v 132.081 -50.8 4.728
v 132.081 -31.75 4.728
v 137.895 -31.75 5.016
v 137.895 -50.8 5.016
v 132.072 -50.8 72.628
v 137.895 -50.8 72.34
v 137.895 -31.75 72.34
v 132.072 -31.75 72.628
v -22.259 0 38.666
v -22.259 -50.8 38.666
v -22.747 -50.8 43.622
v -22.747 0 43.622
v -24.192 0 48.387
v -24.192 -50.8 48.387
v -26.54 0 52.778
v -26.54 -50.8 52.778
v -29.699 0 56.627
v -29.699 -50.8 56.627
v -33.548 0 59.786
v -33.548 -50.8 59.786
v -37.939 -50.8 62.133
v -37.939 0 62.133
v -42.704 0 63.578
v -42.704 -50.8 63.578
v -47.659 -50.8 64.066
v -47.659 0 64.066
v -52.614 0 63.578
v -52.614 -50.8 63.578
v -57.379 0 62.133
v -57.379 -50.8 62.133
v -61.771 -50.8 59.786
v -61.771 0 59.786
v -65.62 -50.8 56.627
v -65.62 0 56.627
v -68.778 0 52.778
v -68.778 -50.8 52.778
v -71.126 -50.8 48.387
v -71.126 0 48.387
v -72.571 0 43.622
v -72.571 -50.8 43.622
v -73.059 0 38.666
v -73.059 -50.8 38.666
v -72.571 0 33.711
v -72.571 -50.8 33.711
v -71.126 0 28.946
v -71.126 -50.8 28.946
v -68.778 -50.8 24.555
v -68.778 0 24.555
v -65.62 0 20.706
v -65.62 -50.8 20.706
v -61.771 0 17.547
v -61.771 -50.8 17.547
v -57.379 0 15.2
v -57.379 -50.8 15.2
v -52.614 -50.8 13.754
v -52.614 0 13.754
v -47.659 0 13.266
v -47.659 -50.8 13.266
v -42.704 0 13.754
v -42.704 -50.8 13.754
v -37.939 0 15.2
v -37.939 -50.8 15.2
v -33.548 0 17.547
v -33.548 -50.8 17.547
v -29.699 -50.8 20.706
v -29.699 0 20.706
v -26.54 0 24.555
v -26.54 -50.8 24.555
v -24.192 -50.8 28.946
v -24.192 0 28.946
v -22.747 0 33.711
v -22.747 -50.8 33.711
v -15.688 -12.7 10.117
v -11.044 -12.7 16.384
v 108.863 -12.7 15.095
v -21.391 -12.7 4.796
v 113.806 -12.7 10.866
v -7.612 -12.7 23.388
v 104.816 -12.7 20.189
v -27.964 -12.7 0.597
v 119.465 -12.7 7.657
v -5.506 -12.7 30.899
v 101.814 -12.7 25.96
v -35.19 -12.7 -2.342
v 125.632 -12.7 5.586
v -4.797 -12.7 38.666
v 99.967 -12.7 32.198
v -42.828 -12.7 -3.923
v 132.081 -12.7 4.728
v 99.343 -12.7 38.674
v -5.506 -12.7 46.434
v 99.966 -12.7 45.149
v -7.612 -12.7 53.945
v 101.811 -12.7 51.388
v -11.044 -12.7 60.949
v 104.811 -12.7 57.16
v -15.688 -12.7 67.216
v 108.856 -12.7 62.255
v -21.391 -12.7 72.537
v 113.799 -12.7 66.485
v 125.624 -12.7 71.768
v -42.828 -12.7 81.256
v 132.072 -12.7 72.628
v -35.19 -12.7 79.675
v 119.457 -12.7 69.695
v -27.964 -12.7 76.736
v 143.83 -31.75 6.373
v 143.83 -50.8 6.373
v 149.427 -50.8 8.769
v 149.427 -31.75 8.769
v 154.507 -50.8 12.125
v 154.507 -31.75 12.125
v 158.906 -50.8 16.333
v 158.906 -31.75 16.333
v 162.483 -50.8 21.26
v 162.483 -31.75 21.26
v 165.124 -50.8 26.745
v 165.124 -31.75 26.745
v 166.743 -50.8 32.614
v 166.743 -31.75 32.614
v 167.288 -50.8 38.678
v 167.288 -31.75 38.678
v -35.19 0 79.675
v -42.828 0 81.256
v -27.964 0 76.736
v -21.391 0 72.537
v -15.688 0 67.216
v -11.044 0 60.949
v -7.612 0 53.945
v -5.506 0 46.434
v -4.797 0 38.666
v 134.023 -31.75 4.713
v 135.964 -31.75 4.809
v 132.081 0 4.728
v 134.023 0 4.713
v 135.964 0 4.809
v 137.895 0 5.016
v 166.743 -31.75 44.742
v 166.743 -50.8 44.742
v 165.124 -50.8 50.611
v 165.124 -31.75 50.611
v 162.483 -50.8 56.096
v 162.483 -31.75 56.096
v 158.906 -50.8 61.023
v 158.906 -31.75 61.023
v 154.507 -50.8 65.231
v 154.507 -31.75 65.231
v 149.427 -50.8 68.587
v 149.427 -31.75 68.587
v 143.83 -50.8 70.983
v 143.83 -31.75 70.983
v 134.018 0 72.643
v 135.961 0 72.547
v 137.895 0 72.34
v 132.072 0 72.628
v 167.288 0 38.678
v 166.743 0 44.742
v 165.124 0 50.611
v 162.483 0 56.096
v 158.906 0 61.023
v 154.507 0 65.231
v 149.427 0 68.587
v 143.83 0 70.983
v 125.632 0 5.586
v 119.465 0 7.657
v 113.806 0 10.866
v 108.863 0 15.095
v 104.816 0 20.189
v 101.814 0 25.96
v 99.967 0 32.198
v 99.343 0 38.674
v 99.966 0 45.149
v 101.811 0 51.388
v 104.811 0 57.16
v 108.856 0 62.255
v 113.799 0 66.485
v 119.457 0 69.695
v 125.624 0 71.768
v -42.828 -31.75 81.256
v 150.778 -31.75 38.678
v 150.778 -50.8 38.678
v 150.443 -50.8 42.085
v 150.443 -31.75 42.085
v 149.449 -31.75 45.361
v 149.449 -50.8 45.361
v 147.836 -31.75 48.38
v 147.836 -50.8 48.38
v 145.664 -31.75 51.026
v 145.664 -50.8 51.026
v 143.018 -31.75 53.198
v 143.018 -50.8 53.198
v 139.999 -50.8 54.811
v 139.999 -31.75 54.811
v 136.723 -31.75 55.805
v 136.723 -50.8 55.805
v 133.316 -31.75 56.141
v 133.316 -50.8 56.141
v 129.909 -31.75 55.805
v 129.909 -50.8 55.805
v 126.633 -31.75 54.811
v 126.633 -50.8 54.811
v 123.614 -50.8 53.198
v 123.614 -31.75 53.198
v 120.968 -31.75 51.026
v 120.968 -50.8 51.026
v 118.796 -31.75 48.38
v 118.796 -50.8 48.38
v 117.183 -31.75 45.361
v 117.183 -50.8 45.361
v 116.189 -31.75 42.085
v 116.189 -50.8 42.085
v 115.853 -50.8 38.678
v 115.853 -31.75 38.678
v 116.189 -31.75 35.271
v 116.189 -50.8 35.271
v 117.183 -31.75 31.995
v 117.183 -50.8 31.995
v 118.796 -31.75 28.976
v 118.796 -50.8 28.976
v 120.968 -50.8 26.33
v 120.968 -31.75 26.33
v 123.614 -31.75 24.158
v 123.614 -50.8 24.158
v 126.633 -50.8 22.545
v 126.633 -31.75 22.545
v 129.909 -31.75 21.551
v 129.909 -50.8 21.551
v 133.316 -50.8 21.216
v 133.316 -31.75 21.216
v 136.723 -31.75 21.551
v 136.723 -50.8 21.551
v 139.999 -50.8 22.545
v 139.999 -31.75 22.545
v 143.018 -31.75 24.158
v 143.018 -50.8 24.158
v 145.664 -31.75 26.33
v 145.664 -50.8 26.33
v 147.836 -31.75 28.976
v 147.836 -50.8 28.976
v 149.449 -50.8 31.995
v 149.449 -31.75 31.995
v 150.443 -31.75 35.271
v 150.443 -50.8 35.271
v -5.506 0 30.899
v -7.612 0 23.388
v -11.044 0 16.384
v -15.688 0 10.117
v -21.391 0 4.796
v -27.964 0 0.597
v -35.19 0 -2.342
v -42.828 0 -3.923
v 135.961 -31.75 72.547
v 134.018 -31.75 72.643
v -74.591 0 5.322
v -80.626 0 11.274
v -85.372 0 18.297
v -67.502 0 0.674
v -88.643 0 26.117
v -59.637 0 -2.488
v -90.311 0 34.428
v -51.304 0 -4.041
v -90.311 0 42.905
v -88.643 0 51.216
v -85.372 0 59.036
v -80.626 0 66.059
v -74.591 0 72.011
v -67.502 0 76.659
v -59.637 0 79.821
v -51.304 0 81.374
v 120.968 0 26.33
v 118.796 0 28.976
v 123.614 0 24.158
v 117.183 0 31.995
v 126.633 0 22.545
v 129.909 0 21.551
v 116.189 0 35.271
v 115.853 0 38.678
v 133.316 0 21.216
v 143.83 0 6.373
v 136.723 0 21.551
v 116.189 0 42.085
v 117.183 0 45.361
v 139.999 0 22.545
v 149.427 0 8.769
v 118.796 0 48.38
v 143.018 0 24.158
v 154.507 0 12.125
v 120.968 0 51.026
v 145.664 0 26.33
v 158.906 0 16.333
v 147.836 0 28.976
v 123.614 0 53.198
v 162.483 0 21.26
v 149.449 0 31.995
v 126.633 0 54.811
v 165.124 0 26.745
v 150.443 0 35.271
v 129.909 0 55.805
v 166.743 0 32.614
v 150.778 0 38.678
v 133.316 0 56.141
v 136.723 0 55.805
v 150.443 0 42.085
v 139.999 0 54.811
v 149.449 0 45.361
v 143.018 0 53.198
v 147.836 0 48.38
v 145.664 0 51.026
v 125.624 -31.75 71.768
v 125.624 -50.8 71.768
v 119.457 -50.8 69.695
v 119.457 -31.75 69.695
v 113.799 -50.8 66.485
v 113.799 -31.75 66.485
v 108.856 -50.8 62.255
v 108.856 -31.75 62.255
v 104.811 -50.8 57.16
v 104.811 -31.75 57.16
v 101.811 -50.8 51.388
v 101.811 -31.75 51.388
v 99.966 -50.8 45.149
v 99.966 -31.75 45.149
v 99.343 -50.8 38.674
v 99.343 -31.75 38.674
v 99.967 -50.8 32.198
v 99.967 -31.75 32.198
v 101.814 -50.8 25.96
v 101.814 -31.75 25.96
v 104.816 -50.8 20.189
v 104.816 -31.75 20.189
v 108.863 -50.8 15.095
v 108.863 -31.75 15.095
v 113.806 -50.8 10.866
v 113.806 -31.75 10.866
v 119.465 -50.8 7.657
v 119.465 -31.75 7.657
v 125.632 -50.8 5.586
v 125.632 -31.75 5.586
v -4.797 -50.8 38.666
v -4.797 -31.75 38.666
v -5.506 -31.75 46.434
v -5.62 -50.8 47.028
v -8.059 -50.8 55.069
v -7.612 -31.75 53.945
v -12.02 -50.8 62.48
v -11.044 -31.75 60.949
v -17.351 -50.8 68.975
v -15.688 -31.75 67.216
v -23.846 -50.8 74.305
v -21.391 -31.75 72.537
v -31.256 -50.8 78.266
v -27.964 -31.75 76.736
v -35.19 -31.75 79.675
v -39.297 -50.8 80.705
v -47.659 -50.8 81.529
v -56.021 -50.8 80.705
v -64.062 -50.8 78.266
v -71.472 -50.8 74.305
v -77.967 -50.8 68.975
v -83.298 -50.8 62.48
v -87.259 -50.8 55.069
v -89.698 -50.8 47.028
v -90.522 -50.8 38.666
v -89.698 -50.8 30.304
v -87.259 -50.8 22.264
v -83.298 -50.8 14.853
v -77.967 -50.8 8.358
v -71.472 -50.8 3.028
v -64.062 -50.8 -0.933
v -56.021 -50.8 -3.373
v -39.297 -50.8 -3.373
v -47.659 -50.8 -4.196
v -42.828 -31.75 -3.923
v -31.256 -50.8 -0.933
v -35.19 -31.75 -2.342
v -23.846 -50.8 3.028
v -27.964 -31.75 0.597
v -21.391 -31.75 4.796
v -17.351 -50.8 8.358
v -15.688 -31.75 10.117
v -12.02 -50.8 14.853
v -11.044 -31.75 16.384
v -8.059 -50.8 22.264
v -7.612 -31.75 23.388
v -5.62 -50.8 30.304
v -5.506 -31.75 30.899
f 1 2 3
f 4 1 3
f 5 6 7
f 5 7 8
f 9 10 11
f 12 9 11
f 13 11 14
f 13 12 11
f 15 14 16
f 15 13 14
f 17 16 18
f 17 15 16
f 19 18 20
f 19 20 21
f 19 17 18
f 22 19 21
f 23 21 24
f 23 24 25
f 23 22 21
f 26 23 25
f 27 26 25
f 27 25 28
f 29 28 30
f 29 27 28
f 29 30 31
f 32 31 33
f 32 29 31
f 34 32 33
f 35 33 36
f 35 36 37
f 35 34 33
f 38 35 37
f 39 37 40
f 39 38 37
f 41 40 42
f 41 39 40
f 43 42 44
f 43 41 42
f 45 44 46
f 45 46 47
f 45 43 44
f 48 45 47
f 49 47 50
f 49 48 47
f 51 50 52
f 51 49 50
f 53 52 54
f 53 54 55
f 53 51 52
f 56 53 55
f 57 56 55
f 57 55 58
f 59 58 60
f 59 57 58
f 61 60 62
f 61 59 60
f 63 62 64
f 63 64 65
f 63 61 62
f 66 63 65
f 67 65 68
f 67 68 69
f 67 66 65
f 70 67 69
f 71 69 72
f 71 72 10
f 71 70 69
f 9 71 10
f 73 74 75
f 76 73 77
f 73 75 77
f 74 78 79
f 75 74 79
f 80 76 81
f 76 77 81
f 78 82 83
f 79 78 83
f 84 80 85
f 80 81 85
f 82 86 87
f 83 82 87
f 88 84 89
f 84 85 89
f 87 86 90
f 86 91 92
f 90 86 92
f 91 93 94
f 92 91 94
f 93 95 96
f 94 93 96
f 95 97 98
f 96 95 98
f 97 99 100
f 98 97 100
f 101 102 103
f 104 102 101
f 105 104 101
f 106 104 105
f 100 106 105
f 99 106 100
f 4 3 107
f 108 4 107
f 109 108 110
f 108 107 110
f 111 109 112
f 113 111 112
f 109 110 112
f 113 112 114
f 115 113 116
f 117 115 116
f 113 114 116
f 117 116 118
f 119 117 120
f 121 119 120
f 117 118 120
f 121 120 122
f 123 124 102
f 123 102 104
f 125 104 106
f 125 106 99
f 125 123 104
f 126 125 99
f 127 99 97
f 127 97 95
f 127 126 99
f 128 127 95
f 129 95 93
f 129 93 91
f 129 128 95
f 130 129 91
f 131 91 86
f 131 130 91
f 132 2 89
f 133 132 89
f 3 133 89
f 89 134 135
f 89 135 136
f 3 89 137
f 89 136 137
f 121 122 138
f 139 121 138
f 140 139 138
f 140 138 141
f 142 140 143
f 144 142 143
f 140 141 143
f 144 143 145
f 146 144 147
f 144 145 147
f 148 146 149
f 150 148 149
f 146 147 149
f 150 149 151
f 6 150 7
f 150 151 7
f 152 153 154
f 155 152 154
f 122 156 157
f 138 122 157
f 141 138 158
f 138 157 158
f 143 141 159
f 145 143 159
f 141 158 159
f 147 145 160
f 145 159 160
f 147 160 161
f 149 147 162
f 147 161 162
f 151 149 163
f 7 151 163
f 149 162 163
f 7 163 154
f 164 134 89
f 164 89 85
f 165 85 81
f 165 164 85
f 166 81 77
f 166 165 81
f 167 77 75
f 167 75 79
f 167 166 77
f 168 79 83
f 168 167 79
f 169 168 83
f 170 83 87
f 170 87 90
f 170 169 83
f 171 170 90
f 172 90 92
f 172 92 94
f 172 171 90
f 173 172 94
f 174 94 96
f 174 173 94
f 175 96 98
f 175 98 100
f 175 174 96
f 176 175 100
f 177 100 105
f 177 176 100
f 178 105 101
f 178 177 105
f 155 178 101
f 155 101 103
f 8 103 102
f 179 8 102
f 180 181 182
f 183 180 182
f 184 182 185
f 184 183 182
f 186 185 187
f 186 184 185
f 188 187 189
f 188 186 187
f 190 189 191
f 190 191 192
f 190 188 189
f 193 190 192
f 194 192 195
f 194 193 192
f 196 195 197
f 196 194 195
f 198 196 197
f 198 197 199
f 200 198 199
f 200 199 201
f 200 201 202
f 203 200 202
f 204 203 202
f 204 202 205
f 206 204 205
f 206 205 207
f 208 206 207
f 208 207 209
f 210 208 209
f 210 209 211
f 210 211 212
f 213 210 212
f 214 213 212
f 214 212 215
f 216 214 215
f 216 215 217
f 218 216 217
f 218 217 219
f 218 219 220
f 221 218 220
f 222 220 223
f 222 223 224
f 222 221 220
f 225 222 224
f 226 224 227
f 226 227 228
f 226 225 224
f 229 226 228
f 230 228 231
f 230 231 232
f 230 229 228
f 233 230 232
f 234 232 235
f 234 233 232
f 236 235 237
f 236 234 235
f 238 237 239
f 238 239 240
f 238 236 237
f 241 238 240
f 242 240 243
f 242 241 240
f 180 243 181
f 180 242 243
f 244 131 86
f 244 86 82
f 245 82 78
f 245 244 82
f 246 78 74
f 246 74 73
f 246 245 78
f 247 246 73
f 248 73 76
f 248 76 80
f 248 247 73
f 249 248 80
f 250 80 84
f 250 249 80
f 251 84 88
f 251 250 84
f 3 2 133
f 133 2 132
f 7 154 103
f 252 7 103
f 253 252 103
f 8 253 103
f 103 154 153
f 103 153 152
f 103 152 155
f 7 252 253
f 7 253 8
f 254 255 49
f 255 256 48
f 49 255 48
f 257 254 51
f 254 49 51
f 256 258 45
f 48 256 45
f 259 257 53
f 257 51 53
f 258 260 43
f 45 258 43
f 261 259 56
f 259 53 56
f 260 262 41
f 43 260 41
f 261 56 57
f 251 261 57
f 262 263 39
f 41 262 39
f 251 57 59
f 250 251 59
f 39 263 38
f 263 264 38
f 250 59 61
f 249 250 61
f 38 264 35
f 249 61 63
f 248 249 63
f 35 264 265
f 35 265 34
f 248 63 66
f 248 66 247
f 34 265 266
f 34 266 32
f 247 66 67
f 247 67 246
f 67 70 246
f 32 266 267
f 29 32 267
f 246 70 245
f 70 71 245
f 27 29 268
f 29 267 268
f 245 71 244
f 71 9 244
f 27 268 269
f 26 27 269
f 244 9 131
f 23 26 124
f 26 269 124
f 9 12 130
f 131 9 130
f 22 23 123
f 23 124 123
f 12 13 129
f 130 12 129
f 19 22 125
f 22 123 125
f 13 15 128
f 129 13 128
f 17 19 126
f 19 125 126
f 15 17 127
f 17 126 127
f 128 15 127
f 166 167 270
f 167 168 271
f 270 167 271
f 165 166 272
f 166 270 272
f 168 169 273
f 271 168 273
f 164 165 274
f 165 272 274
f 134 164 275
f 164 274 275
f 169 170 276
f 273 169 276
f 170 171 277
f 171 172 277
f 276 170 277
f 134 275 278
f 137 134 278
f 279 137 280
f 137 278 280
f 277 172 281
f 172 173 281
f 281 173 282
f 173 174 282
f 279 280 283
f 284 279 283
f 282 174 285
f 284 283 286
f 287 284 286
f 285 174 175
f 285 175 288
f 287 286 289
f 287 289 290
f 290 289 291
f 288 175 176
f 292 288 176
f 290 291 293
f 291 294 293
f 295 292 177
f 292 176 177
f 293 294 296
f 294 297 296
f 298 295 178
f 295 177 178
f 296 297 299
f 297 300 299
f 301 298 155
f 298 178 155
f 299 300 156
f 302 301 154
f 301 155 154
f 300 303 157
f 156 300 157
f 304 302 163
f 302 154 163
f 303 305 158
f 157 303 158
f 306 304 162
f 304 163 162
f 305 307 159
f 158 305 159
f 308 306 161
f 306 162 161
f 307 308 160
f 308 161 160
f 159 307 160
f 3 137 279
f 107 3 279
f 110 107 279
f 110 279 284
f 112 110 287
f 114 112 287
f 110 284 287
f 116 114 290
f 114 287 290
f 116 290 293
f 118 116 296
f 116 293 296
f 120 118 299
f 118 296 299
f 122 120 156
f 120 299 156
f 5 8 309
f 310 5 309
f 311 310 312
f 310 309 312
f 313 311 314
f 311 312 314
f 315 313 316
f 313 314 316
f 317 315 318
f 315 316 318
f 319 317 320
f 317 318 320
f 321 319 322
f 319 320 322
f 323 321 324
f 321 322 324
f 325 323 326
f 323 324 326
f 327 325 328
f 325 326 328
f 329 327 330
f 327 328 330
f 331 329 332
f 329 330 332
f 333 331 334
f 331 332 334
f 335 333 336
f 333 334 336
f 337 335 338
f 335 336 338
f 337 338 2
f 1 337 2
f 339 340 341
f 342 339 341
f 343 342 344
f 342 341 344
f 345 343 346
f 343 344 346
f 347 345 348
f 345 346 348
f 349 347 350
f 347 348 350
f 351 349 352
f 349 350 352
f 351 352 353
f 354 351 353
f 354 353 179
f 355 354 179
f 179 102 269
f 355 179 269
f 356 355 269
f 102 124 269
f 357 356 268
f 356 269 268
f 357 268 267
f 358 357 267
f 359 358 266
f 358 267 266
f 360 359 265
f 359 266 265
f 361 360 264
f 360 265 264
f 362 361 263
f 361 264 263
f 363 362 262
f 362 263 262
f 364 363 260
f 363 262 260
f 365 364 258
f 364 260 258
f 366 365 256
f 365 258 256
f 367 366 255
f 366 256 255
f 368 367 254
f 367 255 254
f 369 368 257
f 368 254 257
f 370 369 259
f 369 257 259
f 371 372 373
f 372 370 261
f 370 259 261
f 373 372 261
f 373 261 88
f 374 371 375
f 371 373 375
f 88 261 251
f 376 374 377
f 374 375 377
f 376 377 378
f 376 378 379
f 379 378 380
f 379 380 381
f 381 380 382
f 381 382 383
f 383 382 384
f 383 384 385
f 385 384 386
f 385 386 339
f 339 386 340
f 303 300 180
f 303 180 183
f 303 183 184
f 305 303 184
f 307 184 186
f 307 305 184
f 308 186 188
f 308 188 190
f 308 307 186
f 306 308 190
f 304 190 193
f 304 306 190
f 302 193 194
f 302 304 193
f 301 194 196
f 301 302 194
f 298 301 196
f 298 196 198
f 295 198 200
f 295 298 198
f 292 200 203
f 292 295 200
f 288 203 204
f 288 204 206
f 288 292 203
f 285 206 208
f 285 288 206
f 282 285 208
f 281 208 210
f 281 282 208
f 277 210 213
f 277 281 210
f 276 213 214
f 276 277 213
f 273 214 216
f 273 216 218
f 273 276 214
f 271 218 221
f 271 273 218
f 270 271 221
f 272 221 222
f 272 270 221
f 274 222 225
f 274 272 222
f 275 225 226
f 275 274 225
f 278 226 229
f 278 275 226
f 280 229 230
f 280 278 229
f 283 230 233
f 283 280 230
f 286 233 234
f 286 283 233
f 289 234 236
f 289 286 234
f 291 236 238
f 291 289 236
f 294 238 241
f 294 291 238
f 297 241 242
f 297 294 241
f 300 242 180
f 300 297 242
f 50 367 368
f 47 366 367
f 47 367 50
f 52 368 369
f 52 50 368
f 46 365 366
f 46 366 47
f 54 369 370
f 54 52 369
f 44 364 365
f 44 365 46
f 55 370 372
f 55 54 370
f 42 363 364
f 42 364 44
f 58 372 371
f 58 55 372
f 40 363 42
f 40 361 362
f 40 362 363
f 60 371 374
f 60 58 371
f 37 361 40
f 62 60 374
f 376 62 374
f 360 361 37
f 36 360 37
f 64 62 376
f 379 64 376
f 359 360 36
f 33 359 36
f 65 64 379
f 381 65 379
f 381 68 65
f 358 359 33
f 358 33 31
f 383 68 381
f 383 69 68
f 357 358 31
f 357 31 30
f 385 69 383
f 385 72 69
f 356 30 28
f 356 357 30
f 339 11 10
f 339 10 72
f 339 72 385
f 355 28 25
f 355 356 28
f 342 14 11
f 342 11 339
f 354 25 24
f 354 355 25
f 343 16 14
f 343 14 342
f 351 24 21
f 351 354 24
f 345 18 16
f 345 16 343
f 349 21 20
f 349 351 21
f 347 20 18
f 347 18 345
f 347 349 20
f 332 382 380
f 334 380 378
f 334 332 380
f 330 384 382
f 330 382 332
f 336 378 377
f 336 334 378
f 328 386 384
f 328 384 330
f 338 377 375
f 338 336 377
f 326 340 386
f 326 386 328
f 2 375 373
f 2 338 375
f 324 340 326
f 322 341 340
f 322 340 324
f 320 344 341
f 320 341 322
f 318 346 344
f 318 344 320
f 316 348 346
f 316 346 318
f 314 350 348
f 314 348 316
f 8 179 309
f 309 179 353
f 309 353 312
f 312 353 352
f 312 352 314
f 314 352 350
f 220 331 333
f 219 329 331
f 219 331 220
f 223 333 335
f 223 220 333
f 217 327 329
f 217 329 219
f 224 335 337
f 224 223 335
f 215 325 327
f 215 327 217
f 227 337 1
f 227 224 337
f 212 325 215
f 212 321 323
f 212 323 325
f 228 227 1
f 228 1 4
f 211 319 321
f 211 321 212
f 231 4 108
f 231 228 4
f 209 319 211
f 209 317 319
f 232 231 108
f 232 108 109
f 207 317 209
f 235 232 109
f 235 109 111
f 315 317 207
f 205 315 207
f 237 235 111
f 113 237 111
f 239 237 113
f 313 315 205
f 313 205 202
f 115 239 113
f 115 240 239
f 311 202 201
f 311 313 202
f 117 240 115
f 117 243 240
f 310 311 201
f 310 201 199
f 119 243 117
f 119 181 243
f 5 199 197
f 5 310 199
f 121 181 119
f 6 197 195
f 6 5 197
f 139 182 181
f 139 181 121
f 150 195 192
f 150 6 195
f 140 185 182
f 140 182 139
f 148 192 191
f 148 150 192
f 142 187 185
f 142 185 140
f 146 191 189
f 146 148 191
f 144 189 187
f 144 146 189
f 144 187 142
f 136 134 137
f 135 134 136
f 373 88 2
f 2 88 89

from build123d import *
from build123d import SkipClean  # not in build123d's __all__

# Parameters (mm, degrees)
F0_R     = 17.4625
F1_DEPTH = 31.75
F2_DEPTH = 31.75
F0_R_2   = 25.4
F3_DEPTH = 50.8
F4_DEPTH = 12.7
F5_DEPTH = 50.8


with BuildPart() as f1:
    # F0 (on Front) → F1 (new body)
    with BuildSketch(Plane.XZ):
        with BuildLine():
            ThreePointArc((137.8952277792, 72.3404701197), (134.9898494581, 72.609247784), (132.0721238048, 72.6277311095))
            Line((132.0721238048, 72.6277311095), (137.8952277792, 72.3404701197))
        make_face()
        with BuildLine():
            Line((137.8952277792, 5.0155493856), (132.0808217973, 4.7279708331))
            ThreePointArc((132.0808217973, 4.7279708331), (134.9941960526, 4.7469864233), (137.8952277792, 5.0155493856))
        make_face()
        with BuildLine():
            Line((137.8952277792, 72.3404701197), (132.0721238048, 72.6277311095))
            ThreePointArc((132.0721238048, 72.6277311095), (99.3434793984, 38.6736578588), (132.0808217973, 4.7279708331))
            Line((132.0808217973, 4.7279708331), (137.8952277792, 5.0155493856))
            ThreePointArc((137.8952277792, 5.0155493856), (158.9060092226, 16.333410504), (167.2884791197, 38.6780097526))
            ThreePointArc((167.2884791197, 38.6780097526), (158.9060092226, 61.0226090013), (137.8952277792, 72.3404701197))
        make_face()
        with Locations((133.3159791197, 38.6780097526)):
            Circle(F0_R, mode=Mode.SUBTRACT)
    extrude(amount=F1_DEPTH)

    # F0 (on Front) → F2 (join)
    with BuildSketch(Plane.XZ):
        with BuildLine():
            ThreePointArc((-42.8278144375, 81.2557634421), (-15.6881628684, 67.2156297522), (-4.7965205083, 38.6664061547))
            ThreePointArc((-4.7965205083, 38.6664061547), (-15.6881628684, 10.1171825573), (-42.8278144375, -3.9229511326))
            Line((-42.8278144375, -3.9229511326), (132.0808217973, 4.7279708331))
            ThreePointArc((132.0808217973, 4.7279708331), (99.3434793984, 38.6736578588), (132.0721238048, 72.6277311095))
            Line((132.0721238048, 72.6277311095), (-42.8278144375, 81.2557634421))
        make_face()
    extrude(amount=F2_DEPTH)

    # F0 (on Front) → F3 (join)
    with BuildSketch(Plane.XZ):
        with BuildLine():
            ThreePointArc((-42.8278144375, -3.9229511326), (-15.6881628684, 10.1171825573), (-4.7965205083, 38.6664061547))
            ThreePointArc((-4.7965205083, 38.6664061547), (-15.6881628684, 67.2156297522), (-42.8278144375, 81.2557634421))
            ThreePointArc((-42.8278144375, 81.2557634421), (-90.5215205083, 38.6664061547), (-42.8278144375, -3.9229511326))
        make_face()
        with Locations((-47.6590205083, 38.6664061547)):
            Circle(F0_R_2, mode=Mode.SUBTRACT)
    extrude(amount=F3_DEPTH)

    # F0 (on Front) → F4 (cut)
    with BuildSketch(Plane.XZ):
        with BuildLine():
            ThreePointArc((-42.8278144375, 81.2557634421), (-15.6881628684, 67.2156297522), (-4.7965205083, 38.6664061547))
            ThreePointArc((-4.7965205083, 38.6664061547), (-15.6881628684, 10.1171825573), (-42.8278144375, -3.9229511326))
            Line((-42.8278144375, -3.9229511326), (132.0808217973, 4.7279708331))
            ThreePointArc((132.0808217973, 4.7279708331), (99.3434793984, 38.6736578588), (132.0721238048, 72.6277311095))
            Line((132.0721238048, 72.6277311095), (-42.8278144375, 81.2557634421))
        make_face()
    with SkipClean():  # cleaning this boolean's faces spoils the solid; the shape is the same uncleaned
        extrude(amount=F4_DEPTH, mode=Mode.SUBTRACT)

    # F0 (on Front) → F5 (join)
    with BuildSketch(Plane.XZ):
        with BuildLine():
            Line((137.8952277792, 72.3404701197), (132.0721238048, 72.6277311095))
            ThreePointArc((132.0721238048, 72.6277311095), (99.3434793984, 38.6736578588), (132.0808217973, 4.7279708331))
            Line((132.0808217973, 4.7279708331), (137.8952277792, 5.0155493856))
            ThreePointArc((137.8952277792, 5.0155493856), (158.9060092226, 16.333410504), (167.2884791197, 38.6780097526))
            ThreePointArc((167.2884791197, 38.6780097526), (158.9060092226, 61.0226090013), (137.8952277792, 72.3404701197))
        make_face()
        with Locations((133.3159791197, 38.6780097526)):
            Circle(F0_R, mode=Mode.SUBTRACT)
    with SkipClean():  # cleaning this boolean's faces spoils the solid; the shape is the same uncleaned
        extrude(amount=F5_DEPTH)


solid = f1.part
